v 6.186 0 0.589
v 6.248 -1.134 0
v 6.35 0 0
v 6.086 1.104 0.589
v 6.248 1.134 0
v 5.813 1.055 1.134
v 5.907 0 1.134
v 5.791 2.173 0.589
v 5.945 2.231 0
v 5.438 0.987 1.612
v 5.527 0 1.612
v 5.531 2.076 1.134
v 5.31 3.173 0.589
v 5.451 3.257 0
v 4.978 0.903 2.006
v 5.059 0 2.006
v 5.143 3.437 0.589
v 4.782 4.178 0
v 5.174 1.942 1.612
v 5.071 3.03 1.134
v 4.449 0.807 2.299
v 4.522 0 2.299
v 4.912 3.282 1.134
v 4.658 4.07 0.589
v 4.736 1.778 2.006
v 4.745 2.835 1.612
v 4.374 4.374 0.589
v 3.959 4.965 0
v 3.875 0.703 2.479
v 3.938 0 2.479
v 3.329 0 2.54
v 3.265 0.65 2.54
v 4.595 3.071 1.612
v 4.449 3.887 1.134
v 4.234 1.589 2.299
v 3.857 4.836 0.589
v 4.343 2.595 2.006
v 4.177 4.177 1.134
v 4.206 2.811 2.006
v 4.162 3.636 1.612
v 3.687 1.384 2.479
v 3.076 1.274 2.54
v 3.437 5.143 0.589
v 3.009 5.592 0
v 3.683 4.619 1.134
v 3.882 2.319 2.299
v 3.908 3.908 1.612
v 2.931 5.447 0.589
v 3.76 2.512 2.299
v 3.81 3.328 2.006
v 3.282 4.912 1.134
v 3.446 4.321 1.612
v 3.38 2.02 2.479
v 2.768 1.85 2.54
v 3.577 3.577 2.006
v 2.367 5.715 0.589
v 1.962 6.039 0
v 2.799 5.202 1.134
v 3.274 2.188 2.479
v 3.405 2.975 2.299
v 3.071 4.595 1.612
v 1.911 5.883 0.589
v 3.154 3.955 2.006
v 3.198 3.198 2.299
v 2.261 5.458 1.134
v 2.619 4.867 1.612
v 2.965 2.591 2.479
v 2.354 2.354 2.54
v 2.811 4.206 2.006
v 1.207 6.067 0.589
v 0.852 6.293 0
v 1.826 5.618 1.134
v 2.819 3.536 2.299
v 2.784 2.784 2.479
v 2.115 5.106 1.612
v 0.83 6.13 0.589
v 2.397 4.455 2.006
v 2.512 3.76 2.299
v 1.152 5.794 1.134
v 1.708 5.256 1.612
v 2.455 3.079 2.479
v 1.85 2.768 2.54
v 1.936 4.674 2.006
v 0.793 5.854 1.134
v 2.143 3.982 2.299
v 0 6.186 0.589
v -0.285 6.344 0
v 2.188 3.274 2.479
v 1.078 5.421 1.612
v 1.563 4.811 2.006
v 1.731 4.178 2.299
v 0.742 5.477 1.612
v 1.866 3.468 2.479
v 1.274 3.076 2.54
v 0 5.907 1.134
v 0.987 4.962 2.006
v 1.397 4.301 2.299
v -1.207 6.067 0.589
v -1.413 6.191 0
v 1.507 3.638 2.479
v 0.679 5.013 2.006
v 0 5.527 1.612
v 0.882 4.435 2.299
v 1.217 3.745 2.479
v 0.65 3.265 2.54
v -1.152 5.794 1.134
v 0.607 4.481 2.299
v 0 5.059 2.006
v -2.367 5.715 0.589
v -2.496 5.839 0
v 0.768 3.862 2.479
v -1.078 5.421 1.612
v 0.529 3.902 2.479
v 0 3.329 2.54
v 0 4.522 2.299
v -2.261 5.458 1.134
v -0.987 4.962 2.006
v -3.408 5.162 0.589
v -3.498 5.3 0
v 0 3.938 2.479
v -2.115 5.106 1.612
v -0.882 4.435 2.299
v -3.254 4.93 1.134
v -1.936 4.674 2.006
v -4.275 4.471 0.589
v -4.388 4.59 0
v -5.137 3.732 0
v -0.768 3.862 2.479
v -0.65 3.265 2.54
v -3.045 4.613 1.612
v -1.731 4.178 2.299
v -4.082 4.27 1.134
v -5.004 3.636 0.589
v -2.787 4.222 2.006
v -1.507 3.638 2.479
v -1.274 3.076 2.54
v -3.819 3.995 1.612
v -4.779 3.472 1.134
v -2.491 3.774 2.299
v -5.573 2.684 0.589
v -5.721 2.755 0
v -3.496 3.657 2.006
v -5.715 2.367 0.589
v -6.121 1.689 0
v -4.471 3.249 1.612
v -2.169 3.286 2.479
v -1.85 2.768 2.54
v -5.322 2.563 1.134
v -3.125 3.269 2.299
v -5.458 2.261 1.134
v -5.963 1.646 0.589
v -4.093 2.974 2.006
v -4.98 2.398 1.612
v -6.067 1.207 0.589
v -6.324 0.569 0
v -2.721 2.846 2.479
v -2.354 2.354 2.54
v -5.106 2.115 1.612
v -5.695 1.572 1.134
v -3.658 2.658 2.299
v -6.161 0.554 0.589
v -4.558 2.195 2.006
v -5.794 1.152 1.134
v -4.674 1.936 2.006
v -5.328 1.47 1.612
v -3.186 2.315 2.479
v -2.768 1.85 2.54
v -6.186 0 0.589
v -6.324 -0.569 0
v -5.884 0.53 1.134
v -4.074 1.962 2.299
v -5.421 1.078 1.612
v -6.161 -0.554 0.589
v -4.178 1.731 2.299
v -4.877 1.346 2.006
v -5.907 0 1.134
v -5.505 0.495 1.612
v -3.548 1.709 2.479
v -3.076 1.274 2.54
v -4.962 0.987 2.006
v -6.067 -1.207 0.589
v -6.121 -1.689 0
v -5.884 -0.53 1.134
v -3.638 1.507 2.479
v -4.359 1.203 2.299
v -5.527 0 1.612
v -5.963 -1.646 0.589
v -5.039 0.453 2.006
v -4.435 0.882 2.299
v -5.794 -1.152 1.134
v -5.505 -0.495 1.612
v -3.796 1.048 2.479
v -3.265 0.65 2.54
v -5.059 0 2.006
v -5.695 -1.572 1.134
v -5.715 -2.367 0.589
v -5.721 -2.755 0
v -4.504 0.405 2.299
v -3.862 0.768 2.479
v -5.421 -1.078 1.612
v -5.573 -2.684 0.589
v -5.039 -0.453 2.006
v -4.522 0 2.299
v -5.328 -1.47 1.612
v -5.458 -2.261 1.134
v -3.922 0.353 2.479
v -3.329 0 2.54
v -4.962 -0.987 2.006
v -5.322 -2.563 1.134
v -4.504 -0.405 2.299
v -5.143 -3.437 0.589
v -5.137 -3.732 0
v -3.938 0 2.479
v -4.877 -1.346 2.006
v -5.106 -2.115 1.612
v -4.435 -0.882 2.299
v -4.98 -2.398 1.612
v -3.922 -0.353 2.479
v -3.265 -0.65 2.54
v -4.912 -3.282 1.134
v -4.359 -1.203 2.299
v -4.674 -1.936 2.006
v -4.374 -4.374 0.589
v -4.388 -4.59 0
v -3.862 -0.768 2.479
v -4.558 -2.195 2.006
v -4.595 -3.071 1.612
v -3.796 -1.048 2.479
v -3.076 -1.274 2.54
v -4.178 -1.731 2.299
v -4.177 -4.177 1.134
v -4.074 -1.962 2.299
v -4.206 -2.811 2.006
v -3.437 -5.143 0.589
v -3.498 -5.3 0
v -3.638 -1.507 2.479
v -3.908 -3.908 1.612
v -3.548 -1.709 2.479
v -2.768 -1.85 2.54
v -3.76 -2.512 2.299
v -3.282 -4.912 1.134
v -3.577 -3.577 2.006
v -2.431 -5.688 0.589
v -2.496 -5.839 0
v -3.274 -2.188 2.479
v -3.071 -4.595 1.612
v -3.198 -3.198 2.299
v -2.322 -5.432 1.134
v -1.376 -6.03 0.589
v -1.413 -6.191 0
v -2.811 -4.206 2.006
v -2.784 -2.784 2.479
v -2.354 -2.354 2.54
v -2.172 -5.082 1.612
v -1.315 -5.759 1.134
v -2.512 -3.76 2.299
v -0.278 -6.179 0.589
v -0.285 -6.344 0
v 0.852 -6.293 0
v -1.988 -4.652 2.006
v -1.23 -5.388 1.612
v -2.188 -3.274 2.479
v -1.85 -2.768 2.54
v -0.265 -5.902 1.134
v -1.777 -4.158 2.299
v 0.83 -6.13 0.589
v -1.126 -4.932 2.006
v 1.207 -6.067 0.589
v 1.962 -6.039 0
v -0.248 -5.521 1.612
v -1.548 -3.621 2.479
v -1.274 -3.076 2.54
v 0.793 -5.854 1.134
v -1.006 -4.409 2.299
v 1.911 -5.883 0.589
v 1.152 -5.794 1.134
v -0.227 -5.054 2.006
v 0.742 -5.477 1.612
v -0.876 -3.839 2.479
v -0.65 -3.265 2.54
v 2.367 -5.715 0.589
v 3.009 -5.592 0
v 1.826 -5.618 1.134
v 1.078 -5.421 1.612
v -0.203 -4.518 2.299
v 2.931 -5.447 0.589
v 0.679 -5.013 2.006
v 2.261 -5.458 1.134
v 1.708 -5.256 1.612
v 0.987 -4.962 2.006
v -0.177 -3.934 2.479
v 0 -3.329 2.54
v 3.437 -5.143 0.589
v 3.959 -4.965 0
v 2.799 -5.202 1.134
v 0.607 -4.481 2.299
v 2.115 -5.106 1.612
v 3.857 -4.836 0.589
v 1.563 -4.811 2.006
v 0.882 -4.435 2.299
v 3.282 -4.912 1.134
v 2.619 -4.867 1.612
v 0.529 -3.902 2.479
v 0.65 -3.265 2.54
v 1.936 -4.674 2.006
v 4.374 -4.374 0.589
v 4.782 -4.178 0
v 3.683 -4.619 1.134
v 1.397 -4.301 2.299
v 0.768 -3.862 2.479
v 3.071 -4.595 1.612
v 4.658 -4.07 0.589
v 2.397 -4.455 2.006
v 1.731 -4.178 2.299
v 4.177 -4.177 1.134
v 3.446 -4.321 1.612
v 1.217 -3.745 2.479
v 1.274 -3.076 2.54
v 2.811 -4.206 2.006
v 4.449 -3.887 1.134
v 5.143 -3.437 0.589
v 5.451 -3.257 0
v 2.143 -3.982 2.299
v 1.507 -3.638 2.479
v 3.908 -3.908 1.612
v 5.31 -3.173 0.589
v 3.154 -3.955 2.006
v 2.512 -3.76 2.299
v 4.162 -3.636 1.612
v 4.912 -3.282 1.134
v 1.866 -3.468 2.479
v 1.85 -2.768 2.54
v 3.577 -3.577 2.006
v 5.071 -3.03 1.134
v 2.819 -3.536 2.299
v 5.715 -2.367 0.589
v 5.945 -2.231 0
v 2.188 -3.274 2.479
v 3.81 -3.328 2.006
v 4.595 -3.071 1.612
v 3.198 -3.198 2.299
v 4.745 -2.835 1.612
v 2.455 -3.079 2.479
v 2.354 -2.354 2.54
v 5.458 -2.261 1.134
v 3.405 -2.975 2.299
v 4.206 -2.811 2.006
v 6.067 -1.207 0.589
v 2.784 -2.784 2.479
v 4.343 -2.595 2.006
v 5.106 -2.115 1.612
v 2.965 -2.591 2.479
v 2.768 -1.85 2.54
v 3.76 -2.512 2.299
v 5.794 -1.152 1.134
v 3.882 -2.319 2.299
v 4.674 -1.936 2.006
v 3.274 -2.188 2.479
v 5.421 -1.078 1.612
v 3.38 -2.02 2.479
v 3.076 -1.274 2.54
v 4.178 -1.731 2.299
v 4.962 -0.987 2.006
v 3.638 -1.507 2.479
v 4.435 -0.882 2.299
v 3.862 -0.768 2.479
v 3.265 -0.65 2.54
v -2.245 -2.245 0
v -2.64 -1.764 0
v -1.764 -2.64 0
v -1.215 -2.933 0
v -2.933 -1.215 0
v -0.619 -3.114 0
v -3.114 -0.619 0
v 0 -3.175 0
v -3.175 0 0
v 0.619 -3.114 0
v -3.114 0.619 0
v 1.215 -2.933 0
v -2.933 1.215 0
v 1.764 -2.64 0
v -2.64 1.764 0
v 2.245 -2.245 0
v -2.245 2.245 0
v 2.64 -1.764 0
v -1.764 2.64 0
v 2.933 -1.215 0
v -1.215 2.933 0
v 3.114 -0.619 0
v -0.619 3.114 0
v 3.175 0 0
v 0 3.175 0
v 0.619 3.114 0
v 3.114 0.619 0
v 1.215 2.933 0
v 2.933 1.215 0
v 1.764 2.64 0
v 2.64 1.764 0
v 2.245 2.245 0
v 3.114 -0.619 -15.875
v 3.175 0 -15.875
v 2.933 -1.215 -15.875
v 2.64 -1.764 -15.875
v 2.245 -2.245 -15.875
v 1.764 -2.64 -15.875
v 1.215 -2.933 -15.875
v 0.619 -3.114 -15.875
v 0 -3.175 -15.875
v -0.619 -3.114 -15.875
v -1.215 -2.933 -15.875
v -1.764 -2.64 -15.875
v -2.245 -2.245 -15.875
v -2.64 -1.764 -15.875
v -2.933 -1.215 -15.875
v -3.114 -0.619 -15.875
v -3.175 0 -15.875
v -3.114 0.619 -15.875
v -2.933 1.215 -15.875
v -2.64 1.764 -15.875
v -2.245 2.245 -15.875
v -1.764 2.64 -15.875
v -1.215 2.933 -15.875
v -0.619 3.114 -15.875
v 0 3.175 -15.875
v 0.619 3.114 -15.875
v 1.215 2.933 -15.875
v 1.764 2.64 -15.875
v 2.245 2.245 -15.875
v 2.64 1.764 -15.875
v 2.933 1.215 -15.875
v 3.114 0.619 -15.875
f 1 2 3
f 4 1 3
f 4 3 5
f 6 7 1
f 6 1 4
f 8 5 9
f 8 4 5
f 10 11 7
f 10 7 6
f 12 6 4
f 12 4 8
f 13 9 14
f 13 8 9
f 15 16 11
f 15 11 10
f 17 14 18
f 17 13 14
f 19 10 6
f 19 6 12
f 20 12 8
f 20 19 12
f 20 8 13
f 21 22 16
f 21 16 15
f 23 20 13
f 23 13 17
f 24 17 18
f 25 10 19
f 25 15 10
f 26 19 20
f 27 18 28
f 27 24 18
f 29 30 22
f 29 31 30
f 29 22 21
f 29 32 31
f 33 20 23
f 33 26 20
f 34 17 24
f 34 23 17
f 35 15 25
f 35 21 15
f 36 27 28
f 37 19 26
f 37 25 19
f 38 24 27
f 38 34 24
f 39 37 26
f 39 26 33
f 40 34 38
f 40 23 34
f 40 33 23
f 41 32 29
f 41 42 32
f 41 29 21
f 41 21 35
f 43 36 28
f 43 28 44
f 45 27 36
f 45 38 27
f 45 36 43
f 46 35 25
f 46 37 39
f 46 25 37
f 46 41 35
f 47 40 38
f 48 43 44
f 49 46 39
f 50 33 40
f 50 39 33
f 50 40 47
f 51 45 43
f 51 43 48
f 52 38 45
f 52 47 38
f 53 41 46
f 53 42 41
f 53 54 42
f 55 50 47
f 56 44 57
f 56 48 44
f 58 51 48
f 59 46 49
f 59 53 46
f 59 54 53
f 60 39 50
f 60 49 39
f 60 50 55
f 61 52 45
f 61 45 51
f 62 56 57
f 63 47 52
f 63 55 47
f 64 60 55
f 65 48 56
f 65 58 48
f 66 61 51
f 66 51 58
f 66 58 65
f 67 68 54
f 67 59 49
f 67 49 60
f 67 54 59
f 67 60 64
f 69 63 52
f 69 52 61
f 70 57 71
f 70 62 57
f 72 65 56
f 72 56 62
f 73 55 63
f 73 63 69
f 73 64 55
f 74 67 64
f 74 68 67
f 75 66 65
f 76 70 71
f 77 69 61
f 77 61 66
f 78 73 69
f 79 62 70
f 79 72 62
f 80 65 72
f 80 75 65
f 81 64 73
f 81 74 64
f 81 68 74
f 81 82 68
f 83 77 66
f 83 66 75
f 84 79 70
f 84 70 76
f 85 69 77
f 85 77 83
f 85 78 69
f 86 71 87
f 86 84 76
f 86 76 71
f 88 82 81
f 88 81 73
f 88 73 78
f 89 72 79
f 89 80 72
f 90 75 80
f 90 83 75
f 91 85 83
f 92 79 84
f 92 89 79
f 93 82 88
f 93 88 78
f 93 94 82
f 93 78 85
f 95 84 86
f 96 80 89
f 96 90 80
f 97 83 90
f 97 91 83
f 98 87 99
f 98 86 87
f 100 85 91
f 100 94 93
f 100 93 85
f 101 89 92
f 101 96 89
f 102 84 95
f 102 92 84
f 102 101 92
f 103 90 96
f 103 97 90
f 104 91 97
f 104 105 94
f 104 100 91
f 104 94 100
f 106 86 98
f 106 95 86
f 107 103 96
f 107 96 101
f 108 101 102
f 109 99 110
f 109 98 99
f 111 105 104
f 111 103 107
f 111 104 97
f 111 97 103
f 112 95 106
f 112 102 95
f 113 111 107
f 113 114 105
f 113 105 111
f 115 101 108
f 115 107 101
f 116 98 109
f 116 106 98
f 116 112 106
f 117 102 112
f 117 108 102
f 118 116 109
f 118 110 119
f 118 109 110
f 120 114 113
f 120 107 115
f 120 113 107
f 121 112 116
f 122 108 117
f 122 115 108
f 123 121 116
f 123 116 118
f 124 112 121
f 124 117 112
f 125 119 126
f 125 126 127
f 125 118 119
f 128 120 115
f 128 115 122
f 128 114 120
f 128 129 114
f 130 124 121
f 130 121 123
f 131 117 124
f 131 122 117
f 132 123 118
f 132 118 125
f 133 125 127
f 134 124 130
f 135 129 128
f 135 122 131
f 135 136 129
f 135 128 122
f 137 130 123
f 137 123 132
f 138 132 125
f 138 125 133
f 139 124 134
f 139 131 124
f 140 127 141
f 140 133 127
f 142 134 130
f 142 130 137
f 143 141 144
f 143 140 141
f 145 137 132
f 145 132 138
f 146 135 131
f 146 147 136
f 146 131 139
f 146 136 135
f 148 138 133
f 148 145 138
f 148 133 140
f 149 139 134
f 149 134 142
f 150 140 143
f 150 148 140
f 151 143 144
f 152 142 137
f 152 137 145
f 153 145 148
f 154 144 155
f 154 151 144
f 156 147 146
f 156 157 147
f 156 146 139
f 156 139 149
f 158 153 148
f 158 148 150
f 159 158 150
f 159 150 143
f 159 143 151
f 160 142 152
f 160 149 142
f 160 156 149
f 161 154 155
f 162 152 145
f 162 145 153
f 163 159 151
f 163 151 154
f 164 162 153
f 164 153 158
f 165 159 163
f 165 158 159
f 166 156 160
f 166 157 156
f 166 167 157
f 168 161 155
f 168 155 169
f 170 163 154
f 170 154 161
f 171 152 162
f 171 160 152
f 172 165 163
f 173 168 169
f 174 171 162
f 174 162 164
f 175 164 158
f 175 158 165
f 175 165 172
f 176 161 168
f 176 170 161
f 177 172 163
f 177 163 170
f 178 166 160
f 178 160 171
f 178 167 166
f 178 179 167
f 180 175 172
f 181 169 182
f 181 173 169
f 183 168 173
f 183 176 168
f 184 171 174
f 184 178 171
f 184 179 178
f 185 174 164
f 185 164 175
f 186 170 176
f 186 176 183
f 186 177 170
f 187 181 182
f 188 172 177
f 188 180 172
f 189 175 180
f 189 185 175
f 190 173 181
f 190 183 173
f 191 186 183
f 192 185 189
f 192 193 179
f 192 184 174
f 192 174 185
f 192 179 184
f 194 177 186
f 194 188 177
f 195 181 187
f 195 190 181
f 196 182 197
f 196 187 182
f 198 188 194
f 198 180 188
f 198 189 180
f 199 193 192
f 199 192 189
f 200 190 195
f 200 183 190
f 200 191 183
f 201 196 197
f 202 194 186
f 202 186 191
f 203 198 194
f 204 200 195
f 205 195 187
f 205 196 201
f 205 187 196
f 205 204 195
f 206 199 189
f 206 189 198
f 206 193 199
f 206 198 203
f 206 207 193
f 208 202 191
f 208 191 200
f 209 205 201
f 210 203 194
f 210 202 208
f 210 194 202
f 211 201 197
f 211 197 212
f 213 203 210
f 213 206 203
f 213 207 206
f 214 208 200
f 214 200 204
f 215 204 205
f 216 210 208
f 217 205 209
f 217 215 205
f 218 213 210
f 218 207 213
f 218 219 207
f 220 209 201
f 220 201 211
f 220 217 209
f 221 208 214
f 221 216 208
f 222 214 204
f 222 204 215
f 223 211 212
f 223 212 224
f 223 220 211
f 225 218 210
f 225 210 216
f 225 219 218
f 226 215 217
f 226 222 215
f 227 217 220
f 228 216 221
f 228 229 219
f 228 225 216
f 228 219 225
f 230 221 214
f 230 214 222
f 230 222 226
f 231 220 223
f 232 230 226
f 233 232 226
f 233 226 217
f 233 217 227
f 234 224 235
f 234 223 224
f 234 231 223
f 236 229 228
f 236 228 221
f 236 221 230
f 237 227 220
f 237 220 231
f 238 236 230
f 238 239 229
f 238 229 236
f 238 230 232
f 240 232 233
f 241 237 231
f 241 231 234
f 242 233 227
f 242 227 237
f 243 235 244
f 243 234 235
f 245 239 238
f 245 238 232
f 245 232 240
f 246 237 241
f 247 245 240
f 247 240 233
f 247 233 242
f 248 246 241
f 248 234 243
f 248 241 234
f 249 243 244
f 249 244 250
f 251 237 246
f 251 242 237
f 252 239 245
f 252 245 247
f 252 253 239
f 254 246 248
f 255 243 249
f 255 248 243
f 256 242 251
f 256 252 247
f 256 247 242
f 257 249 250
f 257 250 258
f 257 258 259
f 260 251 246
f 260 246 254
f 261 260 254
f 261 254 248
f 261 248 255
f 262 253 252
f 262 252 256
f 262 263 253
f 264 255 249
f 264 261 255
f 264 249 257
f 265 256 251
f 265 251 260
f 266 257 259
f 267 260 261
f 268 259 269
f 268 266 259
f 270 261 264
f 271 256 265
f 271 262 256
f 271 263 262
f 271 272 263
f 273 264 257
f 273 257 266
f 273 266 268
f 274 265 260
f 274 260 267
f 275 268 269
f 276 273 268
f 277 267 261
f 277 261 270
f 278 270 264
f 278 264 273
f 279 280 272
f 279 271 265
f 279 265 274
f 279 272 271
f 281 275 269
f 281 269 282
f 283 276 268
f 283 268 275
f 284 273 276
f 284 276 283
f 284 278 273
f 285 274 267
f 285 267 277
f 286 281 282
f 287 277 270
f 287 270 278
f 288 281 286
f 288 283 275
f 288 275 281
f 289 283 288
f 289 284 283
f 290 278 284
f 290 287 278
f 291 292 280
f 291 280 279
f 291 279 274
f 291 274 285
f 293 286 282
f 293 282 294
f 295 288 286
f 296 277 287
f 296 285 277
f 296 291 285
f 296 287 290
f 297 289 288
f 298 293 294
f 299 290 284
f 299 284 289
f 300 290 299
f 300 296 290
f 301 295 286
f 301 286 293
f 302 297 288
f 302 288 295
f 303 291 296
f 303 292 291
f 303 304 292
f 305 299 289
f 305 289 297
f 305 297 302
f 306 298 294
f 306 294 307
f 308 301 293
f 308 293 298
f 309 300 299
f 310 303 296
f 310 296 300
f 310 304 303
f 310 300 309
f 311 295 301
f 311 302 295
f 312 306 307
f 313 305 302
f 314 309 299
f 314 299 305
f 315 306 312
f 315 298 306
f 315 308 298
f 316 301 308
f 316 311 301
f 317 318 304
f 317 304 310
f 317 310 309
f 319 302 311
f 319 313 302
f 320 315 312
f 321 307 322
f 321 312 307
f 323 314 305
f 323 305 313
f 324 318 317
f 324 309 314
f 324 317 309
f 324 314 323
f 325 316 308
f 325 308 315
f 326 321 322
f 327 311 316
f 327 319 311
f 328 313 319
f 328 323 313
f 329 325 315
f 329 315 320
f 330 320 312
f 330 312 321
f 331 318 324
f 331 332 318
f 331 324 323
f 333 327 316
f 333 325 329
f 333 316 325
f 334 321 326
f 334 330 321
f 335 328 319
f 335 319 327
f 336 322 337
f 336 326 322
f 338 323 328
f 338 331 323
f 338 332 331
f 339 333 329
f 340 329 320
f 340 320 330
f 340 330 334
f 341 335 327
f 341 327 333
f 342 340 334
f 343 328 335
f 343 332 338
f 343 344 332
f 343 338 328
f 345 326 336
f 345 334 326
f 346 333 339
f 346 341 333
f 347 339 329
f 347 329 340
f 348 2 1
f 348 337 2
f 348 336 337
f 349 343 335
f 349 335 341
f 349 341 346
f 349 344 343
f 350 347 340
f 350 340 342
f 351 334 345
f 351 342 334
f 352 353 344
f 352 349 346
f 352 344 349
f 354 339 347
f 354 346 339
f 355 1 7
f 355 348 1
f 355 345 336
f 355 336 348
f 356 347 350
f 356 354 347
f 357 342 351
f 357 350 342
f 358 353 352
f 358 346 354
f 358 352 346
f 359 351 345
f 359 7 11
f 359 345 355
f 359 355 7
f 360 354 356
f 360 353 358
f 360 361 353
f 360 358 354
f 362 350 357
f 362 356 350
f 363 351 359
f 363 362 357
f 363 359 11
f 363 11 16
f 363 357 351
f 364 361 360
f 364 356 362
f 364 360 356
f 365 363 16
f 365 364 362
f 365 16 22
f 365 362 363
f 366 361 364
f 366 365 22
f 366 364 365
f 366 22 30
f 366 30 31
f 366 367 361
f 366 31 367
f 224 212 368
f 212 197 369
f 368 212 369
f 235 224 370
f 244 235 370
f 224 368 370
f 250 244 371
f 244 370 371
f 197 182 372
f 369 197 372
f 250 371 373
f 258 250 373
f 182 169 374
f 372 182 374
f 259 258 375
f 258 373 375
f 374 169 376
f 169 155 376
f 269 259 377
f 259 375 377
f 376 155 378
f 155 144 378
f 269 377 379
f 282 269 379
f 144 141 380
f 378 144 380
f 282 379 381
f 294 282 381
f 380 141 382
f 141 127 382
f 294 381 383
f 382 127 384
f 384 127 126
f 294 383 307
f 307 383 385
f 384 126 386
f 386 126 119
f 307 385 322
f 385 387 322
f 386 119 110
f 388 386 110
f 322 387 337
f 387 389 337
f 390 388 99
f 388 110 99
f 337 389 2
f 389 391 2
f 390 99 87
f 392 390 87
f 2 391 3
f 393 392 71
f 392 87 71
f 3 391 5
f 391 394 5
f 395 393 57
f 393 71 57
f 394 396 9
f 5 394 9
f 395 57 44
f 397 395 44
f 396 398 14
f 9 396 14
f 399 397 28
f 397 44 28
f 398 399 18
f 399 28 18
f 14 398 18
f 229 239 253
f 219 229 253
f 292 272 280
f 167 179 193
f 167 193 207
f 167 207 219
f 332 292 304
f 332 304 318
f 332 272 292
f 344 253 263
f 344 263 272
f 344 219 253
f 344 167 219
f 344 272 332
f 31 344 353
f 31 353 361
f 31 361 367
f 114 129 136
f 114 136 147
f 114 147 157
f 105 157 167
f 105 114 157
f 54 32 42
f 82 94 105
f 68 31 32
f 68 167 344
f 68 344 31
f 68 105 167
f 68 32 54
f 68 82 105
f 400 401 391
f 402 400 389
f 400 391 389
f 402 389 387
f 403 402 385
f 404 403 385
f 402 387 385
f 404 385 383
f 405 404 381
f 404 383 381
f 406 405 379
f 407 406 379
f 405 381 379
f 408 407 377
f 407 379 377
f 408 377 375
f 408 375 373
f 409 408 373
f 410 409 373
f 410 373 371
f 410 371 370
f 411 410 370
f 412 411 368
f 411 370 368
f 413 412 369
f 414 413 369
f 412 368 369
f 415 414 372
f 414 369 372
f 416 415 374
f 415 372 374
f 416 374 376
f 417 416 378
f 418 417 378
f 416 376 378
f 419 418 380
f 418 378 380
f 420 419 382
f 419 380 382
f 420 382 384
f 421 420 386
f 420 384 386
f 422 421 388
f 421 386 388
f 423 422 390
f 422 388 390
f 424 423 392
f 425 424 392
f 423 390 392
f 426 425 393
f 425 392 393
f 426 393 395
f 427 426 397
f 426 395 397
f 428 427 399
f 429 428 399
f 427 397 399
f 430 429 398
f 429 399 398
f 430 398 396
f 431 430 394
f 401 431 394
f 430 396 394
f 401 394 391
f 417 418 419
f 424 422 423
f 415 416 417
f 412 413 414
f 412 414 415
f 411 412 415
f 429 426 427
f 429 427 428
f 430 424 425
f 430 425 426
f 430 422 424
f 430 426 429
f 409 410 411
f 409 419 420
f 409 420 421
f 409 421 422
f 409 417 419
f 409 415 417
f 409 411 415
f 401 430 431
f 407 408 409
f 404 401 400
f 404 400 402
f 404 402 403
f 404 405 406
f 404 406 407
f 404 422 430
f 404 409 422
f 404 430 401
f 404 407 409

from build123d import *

# Parameters (mm, degrees)
F0_R     = 6.35
F1_DEPTH = 2.54
F3_R     = 3.175
F4_DEPTH = 15.875


# Not quite as in the source:
# - a fillet or chamfer that OpenCascade refuses, or shapes differently, is made with other operations: its cross-section is extruded or revolved along the edge and cut away or added


with BuildPart() as f1:
    # F0 (on Top) → F1 (new body)
    with BuildSketch(Plane.XY):
        Circle(F0_R)
    extrude(amount=F1_DEPTH)

    # F2: fillet of radius 3.0660512242 on 1 edges, made by hand

    # F2_s1 → F2_t2 (revolve, cut)
    with BuildSketch(Plane.XZ):
        with BuildLine():
            ThreePointArc((6.35, 0), (5.3027068749, 1.8206027884), (3.3294139279, 2.54))
            Line((3.3294139279, 2.54), (6.35, 2.54))
            Line((6.35, 2.54), (6.35, 0))
        make_face()
    revolve(axis=Axis((0, 0, 2.54), (0, 0, 1)), mode=Mode.SUBTRACT)

    # F3 (on face) → F4 (join)
    with BuildSketch(Plane(origin=(0, 0, 0), x_dir=(1, 0, 0), z_dir=(0, 0, -1))):
        Circle(F3_R)
    extrude(amount=F4_DEPTH)


solid = f1.part
